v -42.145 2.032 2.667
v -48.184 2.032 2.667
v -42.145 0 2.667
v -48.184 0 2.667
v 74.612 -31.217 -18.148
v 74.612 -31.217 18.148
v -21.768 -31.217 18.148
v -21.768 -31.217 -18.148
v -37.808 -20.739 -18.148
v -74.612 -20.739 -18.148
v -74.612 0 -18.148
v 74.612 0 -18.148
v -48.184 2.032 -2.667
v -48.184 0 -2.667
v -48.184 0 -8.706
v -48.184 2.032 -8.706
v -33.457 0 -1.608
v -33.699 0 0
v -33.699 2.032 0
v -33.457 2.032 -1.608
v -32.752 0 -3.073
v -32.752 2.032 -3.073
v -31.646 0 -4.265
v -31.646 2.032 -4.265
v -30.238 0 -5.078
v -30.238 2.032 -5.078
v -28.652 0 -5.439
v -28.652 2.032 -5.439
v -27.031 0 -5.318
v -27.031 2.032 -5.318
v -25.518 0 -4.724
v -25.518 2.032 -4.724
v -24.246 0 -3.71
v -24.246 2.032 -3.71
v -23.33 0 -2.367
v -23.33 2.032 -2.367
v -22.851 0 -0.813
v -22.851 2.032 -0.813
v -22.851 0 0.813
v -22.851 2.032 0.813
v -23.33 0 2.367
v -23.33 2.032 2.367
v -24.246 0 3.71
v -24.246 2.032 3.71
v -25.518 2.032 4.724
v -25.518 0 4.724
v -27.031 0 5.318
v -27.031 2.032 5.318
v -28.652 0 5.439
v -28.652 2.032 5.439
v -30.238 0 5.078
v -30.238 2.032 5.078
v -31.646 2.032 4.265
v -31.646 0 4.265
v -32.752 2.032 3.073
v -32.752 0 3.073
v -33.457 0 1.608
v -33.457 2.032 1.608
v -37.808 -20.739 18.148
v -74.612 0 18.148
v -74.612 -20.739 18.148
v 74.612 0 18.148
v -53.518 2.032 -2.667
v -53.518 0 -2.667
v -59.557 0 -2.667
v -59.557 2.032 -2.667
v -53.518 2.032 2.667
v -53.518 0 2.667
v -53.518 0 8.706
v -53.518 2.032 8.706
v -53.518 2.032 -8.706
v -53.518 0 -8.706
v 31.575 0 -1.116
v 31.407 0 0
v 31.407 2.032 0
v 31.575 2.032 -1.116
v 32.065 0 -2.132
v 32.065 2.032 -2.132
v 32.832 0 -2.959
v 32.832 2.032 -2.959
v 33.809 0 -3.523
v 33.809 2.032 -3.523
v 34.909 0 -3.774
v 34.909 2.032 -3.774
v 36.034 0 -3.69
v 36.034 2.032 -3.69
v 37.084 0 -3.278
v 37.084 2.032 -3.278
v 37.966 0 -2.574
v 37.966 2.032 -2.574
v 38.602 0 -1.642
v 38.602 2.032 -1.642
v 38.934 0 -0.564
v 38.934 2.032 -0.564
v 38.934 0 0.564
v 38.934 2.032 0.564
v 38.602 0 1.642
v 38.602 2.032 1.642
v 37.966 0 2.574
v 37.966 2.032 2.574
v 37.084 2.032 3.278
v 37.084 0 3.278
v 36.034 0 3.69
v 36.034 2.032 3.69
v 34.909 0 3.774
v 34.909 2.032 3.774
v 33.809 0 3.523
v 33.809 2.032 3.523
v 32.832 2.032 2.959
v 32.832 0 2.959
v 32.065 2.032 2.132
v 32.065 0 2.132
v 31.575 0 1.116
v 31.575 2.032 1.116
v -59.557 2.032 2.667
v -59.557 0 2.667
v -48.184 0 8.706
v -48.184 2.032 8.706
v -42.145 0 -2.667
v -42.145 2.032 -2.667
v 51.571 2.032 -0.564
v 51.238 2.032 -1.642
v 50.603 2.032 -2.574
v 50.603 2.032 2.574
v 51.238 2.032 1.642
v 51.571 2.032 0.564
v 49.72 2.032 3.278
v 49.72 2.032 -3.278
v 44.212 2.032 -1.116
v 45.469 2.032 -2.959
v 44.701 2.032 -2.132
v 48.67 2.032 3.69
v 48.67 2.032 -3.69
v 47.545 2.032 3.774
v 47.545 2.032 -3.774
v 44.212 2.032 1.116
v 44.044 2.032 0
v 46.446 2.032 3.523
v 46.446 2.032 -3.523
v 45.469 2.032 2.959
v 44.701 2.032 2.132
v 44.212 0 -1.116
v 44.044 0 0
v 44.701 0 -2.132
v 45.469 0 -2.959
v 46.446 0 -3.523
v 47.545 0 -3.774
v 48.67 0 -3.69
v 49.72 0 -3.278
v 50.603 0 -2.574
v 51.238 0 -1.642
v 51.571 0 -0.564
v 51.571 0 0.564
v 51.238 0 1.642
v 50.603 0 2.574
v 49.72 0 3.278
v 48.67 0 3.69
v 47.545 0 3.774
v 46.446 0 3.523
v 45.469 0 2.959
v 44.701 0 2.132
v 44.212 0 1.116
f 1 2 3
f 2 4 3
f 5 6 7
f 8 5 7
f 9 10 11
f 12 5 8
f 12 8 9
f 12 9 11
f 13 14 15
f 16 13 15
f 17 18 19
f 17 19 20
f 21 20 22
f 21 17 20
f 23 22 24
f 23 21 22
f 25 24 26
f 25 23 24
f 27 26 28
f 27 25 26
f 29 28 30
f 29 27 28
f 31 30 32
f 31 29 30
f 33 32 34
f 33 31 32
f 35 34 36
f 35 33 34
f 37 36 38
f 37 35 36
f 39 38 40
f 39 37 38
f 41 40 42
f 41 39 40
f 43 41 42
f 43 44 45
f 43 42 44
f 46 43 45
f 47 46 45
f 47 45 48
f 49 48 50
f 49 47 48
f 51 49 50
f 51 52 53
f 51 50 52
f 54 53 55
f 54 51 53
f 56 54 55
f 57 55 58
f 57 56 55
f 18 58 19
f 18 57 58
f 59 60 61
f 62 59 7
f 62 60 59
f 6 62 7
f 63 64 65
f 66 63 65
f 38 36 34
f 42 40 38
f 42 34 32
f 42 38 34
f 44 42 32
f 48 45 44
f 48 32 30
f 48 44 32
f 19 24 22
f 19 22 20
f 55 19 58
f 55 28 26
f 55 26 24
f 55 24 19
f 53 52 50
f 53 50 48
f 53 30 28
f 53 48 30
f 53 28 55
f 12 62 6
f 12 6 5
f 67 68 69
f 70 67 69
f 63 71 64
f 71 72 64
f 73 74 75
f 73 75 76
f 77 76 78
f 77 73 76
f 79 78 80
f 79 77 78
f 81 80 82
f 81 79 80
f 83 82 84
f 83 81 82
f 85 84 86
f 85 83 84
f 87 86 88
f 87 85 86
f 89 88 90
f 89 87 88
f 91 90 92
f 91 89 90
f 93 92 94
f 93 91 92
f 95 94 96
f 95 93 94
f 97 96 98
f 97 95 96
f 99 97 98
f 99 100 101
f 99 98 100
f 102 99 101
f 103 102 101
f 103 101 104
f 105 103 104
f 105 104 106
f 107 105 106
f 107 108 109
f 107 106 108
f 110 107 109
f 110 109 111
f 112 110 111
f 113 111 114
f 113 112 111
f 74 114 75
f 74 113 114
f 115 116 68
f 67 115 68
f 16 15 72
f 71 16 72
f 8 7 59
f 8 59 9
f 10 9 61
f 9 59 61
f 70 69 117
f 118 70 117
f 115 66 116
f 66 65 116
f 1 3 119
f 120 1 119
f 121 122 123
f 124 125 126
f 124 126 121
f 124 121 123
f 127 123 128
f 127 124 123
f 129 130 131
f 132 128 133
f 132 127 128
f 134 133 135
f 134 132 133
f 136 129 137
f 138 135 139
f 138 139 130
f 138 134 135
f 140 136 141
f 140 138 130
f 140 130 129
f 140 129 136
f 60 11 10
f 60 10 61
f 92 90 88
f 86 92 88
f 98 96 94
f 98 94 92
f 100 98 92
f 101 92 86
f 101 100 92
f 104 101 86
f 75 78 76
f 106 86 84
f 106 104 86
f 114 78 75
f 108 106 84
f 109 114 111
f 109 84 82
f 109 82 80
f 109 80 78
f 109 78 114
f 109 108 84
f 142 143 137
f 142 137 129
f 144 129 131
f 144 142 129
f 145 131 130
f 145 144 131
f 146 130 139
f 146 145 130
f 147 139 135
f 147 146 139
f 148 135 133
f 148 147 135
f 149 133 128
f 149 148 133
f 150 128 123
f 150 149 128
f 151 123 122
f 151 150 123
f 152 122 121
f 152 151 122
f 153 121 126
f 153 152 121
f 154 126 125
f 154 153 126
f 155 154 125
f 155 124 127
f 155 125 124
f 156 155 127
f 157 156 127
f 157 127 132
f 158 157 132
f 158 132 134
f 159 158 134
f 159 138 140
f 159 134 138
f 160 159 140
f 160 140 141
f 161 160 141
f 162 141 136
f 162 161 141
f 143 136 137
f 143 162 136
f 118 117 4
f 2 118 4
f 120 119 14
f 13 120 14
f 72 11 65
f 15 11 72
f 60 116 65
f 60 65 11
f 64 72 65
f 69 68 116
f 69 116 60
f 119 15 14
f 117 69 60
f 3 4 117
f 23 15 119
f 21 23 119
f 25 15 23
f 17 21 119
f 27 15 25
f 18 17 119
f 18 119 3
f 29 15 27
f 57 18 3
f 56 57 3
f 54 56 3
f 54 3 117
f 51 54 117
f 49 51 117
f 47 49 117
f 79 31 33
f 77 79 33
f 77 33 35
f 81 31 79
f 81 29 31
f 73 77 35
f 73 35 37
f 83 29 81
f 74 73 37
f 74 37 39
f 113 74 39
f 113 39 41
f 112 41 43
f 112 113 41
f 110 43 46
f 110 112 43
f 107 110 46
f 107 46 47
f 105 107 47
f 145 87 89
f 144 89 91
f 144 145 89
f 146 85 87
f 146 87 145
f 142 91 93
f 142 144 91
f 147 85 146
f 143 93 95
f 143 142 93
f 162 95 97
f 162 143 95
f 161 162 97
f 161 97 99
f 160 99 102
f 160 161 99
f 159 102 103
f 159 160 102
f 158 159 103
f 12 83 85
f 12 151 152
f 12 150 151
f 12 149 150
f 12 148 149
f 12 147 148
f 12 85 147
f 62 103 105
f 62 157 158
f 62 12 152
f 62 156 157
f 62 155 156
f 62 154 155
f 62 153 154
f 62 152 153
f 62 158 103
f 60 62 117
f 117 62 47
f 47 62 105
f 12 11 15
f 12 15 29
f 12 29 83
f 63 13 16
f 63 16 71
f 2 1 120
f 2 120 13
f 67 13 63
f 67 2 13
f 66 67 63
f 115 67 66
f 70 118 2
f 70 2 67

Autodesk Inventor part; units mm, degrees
ref_plane "YZ Plane" through (0, 0, 0) normal (1, 0, 0) x (0, 1, 0)
ref_plane "XZ Plane" through (0, 0, 0) normal (0, 1, 0) x (-1, 0, 0)
ref_plane "XY Plane" through (0, 0, 0) normal (0, 0, 1) x (1, 0, 0)
sketch "Sketch1" plane through (0, 0, 0) normal (0, 1, 0) x (-1, 0, 0)
  line L0 (-74.6125, -18.1483) -> (74.6125, -18.1483)
  line L1 (74.6125, -18.1483) -> (74.6125, 18.1483)
  line L2 (74.6125, 18.1483) -> (-74.6125, 18.1483)
  line L3 (-74.6125, 18.1483) -> (-74.6125, -18.1483)
  line L4 (74.6125, -18.1483) -> (37.8079, -18.1483)
  line L5 (37.8079, -18.1483) -> (37.8079, 18.1483)
  line L6 (37.8079, 18.1483) -> (74.6125, 18.1483)
  line L7 (74.6125, 18.1483) -> (74.6125, -18.1483)
  line L8 (21.7678, 18.1483) -> (-74.6125, 18.1483)
  line L9 (-74.6125, 18.1483) -> (-74.6125, -18.1483)
  line L10 (-74.6125, -18.1483) -> (21.7678, -18.1483)
  line L11 (21.7678, -18.1483) -> (21.7678, 18.1483)
  line L12 (59.5566, 2.667) -> (42.1449, 2.667)
  line L13 (42.1449, 2.667) -> (42.1449, -2.667)
  line L14 (42.1449, -2.667) -> (59.5566, -2.667)
  line L15 (59.5566, -2.667) -> (59.5566, 2.667)
  line L16 (53.5178, 8.7058) -> (48.1838, 8.7058)
  line L17 (48.1838, 8.7058) -> (48.1838, -8.7058)
  line L18 (48.1838, -8.7058) -> (53.5178, -8.7058)
  line L19 (53.5178, -8.7058) -> (53.5178, 8.7058)
  circle A0 centre (-47.8282, 0) radius 3.7846
  circle A1 centre (-35.1917, 0) radius 3.7846
  circle A2 centre (28.2448, 0) radius 5.4546
  point P0 (0, 0)
  point P1 (50.8508, 0)
  dimension "d0" = 149.225
  dimension "d1" = 36.2966
  dimension "d2" = 36.8046
  dimension "d11" = 17.4117
  dimension "d12" = 5.334
  dimension "d13" = 5.334
  dimension "d14" = 17.4117
  dimension "d15" = 7.5692
  dimension "d16" = 7.5692
  dimension "d17" = 10.9093
extrude "Battery" add sketch "Sketch1" against normal blind 31.2166 contours L3 L2 L11 L0 | A0 | A1
extrude "Sensor" add sketch "Sketch1" against normal blind 20.7391 contours L5 L2 L1 L0 | L15 L14 L19 L12 | L19 L14 L17 L12 | L12 L17 L16 L19 | L17 L14 L13 L12 | L19 L18 L17 L14
loft "Loft1" add section 1 edges at (-37.8079, 0, 0) (-37.8079, -10.3696, 18.1483) (-37.8079, -20.7391, 0) (-37.8079, -10.3696, -18.1483) section 2 edges at (-21.7678, 0, 0) (-21.7678, -15.6083, -18.1483) (-21.7678, -31.2166, 0) (-21.7678, -15.6083, 18.1483)
extrude "1 Button" add sketch "Sketch1" along normal blind 2.032 contours A1
extrude "2 Button" add sketch "Sketch1" along normal blind 2.032 contours A0
extrude "A Button" add sketch "Sketch1" along normal blind 2.032 contours A2
extrude "D-Pad" add sketch "Sketch1" along normal blind 2.032 contours L15 L14 L19 L12 | L19 L14 L17 L12 | L12 L17 L16 L19 | L17 L14 L13 L12 | L19 L18 L17 L14
sketch "Sketch2" plane through (0, 0, 0) normal (0, 1, 0) x (1, 0, 0)
  line L0 (57.8104, -18.1483) -> (57.8104, 18.1483)
  line L1 (-64.8843, -18.1483) -> (-64.8843, 18.1483)
  point P0 (0, 0)
properties part number "wiimote"
